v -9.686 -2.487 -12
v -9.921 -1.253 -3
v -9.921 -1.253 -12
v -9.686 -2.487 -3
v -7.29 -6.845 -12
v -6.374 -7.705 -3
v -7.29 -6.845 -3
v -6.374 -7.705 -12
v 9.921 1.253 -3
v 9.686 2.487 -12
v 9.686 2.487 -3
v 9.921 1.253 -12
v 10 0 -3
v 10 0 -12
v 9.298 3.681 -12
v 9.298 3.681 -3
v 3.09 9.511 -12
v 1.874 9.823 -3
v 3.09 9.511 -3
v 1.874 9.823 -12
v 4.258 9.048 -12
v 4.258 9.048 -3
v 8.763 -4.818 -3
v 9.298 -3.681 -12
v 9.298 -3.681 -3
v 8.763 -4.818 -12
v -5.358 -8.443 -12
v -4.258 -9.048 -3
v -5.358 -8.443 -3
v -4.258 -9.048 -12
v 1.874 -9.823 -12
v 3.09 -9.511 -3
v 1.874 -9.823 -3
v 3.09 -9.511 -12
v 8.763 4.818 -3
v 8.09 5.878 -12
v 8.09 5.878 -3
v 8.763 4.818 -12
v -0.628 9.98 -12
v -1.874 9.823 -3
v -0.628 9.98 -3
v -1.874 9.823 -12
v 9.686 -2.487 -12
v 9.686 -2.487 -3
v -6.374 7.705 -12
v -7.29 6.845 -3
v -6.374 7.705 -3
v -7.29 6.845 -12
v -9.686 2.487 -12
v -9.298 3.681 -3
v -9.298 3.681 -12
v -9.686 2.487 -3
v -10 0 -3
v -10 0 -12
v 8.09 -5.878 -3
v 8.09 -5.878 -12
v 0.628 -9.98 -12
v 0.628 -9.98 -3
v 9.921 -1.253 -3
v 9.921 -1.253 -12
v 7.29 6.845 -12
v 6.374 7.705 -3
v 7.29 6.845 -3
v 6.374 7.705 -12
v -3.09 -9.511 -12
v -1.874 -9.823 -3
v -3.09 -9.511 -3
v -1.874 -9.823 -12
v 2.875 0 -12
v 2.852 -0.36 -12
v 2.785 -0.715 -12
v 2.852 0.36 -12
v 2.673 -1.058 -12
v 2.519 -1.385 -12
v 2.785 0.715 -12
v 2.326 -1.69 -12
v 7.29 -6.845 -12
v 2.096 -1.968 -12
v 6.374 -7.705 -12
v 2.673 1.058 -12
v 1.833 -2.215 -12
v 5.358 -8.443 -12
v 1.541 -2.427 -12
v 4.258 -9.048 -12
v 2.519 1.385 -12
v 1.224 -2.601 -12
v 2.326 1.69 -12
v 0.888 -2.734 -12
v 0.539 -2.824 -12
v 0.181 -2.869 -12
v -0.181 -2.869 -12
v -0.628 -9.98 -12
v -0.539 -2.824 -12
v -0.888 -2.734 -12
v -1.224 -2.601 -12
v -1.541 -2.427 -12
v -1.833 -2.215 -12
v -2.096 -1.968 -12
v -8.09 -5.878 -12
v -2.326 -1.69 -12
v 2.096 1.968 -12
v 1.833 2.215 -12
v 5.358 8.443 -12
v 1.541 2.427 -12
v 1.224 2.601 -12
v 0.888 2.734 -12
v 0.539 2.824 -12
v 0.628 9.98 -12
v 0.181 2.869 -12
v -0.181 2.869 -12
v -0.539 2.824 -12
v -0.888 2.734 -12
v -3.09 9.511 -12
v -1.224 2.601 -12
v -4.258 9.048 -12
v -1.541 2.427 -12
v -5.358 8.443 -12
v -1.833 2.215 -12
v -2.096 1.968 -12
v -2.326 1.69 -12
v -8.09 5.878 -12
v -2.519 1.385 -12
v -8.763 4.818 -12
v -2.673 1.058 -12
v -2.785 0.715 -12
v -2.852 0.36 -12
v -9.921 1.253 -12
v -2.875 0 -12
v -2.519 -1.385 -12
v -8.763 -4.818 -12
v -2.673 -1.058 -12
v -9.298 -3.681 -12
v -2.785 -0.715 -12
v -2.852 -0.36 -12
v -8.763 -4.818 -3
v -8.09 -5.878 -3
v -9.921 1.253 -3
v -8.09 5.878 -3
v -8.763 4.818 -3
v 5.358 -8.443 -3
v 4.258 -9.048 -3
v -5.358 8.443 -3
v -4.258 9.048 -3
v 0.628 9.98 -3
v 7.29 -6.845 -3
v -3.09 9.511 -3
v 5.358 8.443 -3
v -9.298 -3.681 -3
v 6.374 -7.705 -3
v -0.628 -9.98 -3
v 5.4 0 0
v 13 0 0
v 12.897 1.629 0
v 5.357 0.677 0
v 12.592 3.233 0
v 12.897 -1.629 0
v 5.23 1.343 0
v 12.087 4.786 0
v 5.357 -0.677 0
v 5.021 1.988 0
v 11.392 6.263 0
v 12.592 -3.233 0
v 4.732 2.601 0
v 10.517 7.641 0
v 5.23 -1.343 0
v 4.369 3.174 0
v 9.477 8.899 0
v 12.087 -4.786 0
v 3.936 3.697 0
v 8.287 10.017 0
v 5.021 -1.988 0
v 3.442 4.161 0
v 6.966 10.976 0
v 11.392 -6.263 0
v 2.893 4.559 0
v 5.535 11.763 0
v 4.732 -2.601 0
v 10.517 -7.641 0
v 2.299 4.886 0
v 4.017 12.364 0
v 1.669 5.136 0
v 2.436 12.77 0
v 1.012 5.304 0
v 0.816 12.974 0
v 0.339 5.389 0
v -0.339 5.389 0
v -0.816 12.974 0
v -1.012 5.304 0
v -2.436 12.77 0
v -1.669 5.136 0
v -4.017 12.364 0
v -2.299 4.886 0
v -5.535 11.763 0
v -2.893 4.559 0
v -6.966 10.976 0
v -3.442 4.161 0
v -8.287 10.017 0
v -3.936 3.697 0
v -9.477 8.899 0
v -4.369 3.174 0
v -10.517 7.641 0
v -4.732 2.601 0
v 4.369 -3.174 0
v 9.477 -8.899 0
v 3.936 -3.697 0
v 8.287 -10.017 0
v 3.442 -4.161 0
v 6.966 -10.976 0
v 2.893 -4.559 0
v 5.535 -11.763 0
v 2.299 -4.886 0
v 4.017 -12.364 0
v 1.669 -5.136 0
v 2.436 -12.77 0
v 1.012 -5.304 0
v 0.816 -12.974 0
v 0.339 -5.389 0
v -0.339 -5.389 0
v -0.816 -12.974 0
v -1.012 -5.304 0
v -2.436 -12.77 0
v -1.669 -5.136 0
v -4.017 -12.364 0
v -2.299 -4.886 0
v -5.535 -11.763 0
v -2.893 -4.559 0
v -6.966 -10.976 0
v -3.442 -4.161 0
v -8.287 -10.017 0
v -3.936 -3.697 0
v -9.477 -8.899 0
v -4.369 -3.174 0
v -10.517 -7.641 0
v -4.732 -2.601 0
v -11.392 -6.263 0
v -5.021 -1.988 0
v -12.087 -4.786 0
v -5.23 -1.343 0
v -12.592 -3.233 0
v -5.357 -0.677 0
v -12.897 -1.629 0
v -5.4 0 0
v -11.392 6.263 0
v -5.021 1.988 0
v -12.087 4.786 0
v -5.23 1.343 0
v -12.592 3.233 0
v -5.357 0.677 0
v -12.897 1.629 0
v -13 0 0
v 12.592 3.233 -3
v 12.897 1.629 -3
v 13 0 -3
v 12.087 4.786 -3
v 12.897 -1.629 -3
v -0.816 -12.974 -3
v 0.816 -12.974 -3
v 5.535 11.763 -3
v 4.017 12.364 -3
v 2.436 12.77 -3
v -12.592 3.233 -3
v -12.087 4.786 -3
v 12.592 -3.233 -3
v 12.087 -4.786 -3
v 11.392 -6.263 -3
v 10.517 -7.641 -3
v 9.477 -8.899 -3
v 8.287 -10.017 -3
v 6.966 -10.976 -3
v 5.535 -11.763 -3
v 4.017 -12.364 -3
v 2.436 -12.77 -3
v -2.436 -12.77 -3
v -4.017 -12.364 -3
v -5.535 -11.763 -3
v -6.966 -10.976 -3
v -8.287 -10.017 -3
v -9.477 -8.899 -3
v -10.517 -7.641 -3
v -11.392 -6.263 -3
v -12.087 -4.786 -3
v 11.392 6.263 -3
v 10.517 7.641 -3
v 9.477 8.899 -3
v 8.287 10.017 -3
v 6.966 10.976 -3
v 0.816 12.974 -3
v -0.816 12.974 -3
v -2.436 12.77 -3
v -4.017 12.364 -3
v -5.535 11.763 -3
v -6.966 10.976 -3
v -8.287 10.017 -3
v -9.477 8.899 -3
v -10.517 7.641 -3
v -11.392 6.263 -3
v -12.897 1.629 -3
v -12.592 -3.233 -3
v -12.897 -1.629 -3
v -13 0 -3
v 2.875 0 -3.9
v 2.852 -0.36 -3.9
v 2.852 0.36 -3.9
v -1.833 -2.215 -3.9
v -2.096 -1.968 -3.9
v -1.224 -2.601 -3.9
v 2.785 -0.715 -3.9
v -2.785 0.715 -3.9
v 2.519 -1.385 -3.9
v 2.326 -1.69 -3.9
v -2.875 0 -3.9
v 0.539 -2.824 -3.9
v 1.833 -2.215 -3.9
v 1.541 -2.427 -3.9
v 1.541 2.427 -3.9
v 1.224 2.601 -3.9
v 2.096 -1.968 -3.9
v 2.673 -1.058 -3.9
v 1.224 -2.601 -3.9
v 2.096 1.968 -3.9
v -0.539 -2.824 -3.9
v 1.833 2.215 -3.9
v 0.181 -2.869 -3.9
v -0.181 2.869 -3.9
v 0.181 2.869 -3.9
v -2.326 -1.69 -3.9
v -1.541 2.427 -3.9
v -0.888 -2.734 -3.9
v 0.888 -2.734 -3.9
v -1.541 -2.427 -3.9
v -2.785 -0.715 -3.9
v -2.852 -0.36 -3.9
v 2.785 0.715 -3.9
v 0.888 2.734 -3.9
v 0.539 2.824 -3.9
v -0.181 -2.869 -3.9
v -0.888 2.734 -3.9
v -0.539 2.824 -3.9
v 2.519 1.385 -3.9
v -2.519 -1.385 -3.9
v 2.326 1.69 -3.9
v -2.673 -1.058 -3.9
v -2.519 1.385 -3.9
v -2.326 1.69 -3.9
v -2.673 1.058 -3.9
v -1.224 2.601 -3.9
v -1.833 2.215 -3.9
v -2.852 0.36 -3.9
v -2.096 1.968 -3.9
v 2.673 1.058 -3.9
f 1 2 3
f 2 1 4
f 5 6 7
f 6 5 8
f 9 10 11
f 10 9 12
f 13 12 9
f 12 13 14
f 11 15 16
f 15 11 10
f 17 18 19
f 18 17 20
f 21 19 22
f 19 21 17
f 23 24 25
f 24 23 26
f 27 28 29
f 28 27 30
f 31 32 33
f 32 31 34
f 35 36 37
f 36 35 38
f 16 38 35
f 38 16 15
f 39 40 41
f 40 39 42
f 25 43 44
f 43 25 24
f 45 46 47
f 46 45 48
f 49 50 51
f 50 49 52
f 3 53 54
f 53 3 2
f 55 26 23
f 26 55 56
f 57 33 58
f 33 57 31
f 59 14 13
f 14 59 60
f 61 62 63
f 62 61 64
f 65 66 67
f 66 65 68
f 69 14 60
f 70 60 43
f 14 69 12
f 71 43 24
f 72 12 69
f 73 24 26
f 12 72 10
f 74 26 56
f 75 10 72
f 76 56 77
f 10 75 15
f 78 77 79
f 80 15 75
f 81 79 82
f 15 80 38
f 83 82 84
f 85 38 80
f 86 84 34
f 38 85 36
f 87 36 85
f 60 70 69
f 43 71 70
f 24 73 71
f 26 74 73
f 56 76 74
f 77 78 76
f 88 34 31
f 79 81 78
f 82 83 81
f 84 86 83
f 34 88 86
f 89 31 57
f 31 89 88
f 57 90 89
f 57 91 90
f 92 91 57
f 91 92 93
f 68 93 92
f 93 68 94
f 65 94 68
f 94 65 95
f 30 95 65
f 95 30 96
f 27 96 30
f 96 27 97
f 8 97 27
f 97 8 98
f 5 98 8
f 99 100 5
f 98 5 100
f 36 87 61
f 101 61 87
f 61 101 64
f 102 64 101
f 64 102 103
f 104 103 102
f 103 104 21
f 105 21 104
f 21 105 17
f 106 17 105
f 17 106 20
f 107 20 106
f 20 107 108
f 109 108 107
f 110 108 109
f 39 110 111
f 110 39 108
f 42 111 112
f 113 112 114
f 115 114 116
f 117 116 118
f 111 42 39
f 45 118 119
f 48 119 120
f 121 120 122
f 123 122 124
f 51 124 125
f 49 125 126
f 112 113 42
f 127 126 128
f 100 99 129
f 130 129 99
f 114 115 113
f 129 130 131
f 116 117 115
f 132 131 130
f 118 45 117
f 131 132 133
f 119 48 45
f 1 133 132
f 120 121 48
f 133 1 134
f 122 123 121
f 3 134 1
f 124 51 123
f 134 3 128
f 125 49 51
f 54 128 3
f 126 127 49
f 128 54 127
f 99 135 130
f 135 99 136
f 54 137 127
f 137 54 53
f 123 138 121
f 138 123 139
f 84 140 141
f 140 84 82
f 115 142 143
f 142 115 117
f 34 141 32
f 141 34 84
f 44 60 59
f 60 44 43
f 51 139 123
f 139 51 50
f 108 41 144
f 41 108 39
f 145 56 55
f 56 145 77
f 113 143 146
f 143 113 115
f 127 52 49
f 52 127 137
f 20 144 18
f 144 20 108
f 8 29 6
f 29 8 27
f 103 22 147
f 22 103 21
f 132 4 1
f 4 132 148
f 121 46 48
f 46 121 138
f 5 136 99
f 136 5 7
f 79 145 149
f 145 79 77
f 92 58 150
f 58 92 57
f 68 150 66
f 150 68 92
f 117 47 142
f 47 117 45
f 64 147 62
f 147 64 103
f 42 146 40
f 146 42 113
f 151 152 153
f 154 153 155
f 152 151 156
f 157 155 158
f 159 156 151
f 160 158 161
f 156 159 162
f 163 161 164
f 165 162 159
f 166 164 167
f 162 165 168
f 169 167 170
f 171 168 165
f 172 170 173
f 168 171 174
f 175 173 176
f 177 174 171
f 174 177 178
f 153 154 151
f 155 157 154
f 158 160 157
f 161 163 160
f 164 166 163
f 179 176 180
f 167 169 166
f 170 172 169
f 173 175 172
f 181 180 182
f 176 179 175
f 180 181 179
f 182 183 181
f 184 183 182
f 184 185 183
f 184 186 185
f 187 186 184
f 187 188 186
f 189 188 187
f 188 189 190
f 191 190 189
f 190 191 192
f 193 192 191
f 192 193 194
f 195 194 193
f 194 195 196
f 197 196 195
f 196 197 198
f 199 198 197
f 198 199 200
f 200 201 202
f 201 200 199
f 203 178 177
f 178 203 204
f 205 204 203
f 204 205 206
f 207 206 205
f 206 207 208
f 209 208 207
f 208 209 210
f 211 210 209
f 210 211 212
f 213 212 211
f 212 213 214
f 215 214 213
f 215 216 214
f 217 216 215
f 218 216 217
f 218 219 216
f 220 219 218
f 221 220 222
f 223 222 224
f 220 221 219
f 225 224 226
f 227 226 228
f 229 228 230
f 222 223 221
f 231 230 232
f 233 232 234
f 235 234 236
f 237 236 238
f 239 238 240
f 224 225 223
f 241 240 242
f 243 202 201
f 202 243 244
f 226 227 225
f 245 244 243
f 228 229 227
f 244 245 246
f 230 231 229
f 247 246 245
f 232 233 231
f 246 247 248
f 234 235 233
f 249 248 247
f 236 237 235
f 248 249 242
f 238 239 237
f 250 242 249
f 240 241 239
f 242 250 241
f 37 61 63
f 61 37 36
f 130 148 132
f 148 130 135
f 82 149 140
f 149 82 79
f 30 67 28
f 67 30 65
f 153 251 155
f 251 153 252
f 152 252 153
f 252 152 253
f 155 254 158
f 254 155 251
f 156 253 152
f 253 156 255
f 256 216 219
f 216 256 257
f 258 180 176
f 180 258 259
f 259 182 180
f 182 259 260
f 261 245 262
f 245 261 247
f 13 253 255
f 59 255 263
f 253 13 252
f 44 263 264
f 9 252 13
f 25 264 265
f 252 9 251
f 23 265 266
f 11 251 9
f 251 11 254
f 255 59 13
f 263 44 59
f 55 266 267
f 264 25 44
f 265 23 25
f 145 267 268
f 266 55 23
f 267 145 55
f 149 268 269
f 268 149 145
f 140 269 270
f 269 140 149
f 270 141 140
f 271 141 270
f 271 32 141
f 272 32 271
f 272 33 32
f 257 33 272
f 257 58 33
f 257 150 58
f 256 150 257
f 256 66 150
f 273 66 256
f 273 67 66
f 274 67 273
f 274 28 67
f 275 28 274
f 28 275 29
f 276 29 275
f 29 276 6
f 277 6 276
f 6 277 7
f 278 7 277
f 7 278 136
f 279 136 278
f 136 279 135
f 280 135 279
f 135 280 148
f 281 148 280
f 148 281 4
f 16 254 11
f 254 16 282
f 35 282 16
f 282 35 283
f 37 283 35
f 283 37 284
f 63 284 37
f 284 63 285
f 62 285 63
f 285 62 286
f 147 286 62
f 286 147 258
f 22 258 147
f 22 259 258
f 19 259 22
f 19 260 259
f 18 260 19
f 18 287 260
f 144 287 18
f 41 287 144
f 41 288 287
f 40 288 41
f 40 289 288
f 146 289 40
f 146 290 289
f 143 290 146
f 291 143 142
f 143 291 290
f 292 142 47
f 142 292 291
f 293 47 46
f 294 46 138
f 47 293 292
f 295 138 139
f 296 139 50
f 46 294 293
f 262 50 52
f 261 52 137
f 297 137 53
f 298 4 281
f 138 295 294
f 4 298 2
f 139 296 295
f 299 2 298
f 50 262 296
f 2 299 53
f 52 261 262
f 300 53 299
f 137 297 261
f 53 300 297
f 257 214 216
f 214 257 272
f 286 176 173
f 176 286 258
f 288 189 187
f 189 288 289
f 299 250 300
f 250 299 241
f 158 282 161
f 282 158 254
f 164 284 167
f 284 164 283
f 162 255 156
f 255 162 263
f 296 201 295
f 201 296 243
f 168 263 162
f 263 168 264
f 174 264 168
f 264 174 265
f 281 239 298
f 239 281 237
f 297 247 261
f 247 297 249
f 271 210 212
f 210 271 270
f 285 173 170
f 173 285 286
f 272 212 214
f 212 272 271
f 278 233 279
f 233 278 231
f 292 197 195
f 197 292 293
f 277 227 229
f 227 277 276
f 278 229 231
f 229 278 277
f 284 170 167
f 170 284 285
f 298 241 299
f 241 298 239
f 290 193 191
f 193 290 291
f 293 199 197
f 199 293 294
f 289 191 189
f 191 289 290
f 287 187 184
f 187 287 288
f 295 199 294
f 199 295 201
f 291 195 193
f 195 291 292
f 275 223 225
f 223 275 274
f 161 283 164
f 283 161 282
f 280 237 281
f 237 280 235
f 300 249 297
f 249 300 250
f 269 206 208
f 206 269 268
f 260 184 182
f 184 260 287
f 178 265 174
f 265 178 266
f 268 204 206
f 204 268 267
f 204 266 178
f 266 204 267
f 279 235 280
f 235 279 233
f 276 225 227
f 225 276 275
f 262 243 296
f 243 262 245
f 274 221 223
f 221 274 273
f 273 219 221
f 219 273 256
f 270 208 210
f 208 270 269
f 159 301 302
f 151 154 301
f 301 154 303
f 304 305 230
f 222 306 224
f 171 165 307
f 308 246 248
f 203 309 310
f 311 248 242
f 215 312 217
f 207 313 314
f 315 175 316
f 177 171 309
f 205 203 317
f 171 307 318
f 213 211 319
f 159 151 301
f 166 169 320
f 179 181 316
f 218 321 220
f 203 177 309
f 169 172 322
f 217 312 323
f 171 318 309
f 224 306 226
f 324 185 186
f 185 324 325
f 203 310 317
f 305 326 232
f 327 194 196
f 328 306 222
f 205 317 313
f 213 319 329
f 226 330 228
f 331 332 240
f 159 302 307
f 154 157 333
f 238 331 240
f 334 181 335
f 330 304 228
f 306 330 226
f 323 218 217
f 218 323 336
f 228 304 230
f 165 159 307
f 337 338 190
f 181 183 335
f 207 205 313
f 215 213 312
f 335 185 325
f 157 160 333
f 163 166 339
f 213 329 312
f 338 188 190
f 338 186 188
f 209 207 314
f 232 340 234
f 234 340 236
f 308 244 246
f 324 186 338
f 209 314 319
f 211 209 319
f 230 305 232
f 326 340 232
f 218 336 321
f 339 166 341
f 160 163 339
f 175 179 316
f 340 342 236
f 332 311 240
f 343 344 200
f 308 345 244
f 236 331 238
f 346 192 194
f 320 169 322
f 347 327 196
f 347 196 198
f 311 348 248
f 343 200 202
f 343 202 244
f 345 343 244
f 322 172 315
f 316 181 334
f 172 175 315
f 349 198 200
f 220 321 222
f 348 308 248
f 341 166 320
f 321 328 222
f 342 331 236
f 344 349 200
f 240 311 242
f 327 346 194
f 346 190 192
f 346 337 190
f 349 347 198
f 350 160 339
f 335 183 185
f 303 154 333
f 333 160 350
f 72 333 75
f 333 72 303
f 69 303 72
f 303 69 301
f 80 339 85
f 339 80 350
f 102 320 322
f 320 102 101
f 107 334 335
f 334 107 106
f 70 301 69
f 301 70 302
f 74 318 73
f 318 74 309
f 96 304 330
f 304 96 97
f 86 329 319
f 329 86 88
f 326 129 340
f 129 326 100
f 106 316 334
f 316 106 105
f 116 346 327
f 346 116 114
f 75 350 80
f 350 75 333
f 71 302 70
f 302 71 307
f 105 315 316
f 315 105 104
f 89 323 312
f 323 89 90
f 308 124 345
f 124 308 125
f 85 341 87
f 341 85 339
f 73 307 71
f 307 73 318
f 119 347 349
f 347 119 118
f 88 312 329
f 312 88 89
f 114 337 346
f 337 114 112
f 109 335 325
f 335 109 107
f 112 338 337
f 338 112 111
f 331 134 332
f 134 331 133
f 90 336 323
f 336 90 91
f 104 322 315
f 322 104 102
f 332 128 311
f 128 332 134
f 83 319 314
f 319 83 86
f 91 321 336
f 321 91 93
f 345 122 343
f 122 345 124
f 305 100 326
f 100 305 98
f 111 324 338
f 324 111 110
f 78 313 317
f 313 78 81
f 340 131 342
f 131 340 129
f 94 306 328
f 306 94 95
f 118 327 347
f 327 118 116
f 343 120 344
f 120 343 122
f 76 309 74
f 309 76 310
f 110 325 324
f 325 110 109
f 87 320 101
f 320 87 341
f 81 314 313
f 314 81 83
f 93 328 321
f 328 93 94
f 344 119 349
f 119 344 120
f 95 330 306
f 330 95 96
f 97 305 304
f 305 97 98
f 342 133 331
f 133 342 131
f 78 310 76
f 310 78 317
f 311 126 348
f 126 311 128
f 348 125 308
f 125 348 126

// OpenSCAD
$fn = 50;


difference() {
	union() {
		translate(v = [0, 0, -12.0000000000]) {
			cylinder(h = 12, r = 10.0000000000);
		}
		translate(v = [0, 0, -3.0000000000]) {
			cylinder(h = 3, r = 13.0000000000);
		}
	}
	union() {
		translate(v = [0, 0, 0]) {
			rotate(a = [0, 0, 0]) {
				difference() {
					union() {
						#translate(v = [0, 0, -12.0000000000]) {
							cylinder(h = 12, r = 2.6000000000);
						}
						#translate(v = [0, 0, -3.9000000000]) {
							cylinder(h = 3.9000000000, r1 = 2.8750000000, r2 = 5.4000000000);
						}
						#translate(v = [0, 0, -12.0000000000]) {
							cylinder(h = 12, r = 2.8750000000);
						}
						#translate(v = [0, 0, -12.0000000000]) {
							cylinder(h = 12, r = 2.6000000000);
						}
					}
					union();
				}
			}
		}
	}
}
